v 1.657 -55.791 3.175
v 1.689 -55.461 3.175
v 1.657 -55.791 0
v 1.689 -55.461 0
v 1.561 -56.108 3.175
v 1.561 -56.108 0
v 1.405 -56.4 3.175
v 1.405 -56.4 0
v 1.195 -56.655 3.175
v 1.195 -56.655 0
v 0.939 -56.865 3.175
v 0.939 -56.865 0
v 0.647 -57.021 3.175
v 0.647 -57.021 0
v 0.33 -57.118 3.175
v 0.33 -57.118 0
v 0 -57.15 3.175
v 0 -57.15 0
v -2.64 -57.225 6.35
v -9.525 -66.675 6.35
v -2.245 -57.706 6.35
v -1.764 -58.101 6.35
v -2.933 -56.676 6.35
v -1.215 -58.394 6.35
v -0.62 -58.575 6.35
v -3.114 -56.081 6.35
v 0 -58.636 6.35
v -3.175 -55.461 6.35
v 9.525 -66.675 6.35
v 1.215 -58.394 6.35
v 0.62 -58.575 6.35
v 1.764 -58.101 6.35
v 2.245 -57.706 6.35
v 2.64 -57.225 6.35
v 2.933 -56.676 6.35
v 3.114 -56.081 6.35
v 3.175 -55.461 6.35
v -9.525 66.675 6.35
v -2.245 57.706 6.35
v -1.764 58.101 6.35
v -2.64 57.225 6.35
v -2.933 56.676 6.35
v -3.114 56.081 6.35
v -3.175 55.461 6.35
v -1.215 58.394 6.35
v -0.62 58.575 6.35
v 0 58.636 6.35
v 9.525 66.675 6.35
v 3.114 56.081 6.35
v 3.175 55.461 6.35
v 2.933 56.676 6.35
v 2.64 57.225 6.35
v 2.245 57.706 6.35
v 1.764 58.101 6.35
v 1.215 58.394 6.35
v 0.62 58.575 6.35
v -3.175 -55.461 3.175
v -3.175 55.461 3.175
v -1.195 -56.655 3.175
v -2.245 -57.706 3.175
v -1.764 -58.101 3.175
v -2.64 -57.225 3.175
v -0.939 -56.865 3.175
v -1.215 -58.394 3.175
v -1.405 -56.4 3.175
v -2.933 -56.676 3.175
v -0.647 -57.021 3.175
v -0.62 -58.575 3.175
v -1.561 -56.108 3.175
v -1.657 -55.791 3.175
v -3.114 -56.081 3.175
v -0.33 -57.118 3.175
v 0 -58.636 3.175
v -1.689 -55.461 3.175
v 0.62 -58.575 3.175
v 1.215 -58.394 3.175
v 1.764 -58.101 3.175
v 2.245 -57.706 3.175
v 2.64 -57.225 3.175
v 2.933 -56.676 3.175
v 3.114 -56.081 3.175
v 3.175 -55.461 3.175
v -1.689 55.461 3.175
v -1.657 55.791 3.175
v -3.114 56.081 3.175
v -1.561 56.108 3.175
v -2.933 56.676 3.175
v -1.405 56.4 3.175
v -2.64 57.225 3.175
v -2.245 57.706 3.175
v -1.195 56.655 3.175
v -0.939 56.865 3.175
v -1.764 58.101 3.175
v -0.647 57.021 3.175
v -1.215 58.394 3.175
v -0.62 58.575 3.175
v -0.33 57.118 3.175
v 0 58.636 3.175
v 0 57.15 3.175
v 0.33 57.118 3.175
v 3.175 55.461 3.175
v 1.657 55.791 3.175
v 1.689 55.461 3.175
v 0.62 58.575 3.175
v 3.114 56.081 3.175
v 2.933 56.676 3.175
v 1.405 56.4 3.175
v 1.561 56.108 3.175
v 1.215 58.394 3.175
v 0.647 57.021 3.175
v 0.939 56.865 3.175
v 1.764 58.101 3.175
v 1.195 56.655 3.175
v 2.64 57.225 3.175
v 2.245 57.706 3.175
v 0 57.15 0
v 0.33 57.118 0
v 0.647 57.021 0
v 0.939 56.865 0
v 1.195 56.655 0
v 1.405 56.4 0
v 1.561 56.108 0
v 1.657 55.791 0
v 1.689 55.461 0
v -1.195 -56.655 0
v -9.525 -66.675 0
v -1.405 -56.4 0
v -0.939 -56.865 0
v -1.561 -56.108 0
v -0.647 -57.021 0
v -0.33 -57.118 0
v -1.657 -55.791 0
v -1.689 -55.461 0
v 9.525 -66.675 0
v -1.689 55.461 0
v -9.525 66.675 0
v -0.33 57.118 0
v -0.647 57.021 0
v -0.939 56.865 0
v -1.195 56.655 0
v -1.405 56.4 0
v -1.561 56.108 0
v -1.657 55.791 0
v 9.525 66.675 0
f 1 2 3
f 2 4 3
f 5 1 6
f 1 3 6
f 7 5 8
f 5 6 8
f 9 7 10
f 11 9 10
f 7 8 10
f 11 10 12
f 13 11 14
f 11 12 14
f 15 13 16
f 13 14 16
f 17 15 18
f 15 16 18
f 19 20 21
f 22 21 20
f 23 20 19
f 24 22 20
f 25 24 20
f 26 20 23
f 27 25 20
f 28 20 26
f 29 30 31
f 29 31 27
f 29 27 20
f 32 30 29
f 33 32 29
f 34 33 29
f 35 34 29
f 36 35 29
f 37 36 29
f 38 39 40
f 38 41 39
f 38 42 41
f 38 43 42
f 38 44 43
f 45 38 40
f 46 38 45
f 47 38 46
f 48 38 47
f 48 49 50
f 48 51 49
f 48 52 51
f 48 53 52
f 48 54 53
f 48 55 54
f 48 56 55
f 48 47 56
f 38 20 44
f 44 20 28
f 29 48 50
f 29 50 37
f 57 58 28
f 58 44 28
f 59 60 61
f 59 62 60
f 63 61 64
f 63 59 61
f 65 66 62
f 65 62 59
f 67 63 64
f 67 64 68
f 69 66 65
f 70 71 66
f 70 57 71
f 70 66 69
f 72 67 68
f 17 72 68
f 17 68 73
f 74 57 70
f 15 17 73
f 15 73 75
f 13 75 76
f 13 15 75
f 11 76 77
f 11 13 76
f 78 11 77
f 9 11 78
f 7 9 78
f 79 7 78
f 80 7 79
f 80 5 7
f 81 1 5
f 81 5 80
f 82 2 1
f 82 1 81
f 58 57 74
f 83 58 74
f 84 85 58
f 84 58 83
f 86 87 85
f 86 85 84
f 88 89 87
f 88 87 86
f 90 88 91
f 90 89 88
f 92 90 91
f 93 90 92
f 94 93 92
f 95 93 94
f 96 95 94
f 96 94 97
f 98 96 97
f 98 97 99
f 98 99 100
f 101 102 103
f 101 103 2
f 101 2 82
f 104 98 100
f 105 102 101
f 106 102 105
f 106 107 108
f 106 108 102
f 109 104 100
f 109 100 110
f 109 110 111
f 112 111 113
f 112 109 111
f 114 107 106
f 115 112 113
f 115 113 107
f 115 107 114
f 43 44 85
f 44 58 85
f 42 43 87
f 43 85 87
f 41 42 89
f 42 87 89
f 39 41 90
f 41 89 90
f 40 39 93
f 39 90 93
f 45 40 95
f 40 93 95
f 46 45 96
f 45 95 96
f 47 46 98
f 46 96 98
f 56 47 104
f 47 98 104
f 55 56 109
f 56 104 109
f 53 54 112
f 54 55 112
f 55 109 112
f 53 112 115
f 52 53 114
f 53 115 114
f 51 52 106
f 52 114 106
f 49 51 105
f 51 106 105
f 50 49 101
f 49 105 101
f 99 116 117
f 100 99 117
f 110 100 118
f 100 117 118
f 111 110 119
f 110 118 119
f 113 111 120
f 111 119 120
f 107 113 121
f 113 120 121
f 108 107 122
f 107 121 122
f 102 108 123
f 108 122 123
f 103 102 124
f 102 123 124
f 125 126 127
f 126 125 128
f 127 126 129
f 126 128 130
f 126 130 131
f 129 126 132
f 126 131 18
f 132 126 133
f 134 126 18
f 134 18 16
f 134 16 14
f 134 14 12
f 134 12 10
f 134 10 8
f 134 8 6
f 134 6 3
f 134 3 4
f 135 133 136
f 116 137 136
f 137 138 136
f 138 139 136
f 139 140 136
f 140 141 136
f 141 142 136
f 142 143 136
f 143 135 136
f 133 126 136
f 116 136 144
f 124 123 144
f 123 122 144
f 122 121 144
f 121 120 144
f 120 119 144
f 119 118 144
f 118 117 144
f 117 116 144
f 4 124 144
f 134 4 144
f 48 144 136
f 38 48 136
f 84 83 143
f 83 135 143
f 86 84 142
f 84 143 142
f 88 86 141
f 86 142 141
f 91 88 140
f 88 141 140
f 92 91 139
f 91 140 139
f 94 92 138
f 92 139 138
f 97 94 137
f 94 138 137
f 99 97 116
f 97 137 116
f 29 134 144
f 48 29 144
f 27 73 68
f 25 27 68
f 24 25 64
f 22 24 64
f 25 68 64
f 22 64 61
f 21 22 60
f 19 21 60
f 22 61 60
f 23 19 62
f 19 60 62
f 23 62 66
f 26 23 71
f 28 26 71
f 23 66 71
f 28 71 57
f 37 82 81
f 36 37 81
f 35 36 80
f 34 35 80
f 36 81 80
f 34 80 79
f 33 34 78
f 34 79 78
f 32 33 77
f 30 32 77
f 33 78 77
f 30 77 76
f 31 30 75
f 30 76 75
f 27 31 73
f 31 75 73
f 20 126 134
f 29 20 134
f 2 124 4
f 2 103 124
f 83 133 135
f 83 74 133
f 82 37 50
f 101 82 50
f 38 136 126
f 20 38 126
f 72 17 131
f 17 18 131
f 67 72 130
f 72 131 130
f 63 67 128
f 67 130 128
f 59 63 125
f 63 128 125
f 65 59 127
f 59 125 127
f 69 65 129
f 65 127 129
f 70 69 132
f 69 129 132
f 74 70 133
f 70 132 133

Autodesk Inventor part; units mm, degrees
ref_plane "YZ Plane" through (0, 0, 0) normal (1, 0, 0) x (0, 1, 0)
ref_plane "XZ Plane" through (0, 0, 0) normal (0, 1, 0) x (-1, 0, 0)
ref_plane "XY Plane" through (0, 0, 0) normal (0, 0, 1) x (1, 0, 0)
sketch "Sketch1" plane through (0, 0, 0) normal (0, 0, 1) x (1, 0, 0)
  line L0 (-9.525, -66.675) -> (9.525, -66.675)
  line L1 (9.525, -66.675) -> (9.525, 66.675)
  line L2 (9.525, 66.675) -> (-9.525, 66.675)
  line L3 (-9.525, 66.675) -> (-9.525, -66.675)
  line L4 (-9.525, -66.675) -> (9.525, 66.675) construction
  line L5 (9.525, -66.675) -> (-9.525, 66.675) construction
  point P0 (0, 0)
  dimension "d0" = 19.05
  dimension "d1" = 133.35
extrude "Extrusion1" add sketch "Sketch1" along normal blind 6.35
sketch "Sketch4" plane through (0, 0, 6.35) normal (0, 0, 1) x (1, 0, 0)
  line L0 (1.6891, -57.15) -> (-1.6891, -57.15)
  line L1 (-1.6891, -57.15) -> (-1.6891, 57.15)
  line L2 (-1.6891, 57.15) -> (1.6891, 57.15)
  line L3 (1.6891, 57.15) -> (1.6891, -57.15)
  line L4 (1.6891, -57.15) -> (-1.6891, 57.15) construction
  line L5 (-1.6891, -57.15) -> (1.6891, 57.15) construction
  point P0 (0, 0)
  dimension "d16" = 3.3782
  dimension "d17" = 114.3
extrude "Extrusion3" cut sketch "Sketch4" against normal through all
fillet "Fillet2" radius 1.6891 4 edges at (-1.6891, 57.15, 3.175) (1.6891, 57.15, 3.175) (-1.6891, -57.15, 3.175) (1.6891, -57.15, 3.175)
sketch "Sketch5" plane through (0, 0, 6.35) normal (0, 0, 1) x (1, 0, 0)
  line L0 (-3.175, -58.6359) -> (3.175, -58.6359)
  line L1 (3.175, -58.6359) -> (3.175, 58.6359)
  line L2 (3.175, 58.6359) -> (-3.175, 58.6359)
  line L3 (-3.175, 58.6359) -> (-3.175, -58.6359)
  line L4 (-3.175, -58.6359) -> (3.175, 58.6359) construction
  line L5 (3.175, -58.6359) -> (-3.175, 58.6359) construction
  line L6 (1.6891, 55.4609) -> (1.6891, -55.4609) projected
  arc A0 (-1.6891, -55.4609) -> (1.6891, -55.4609) centre (0, -55.4609) ccw projected
  line L7 (-1.6891, -55.4609) -> (-1.6891, 55.4609) projected
  arc A1 (1.6891, 55.4609) -> (-1.6891, 55.4609) centre (0, 55.4609) ccw projected
  line L8 (-9.525, -66.675) -> (9.525, -66.675) projected
  line L9 (9.525, -66.675) -> (9.525, 66.675) projected
  line L10 (9.525, 66.675) -> (-9.525, 66.675) projected
  line L11 (-9.525, 66.675) -> (-9.525, -66.675) projected
  line L12 (-3.175, -58.6359) -> (3.175, -52.2859)
  point P0 (0, 0)
  dimension "d21" = 6.35
  dimension "d31" = 45
extrude "Extrusion4" cut sketch "Sketch5" against normal blind 3.175 contours L12 A0 L6 L1 L0 | L3 L2 L1 L12 L6 A1 L7 A0
fillet "Fillet3" radius 3.175 4 edges at (-3.175, -58.6359, 4.7625) (3.175, -58.6359, 4.7625) (3.175, 58.6359, 4.7625) (-3.175, 58.6359, 4.7625)
equation "\"d0\" = sensorHolderDepth"
equation "\"d1\" = width + internalAcrylicThickness"
equation "\"d2\" = acrylicThickness"
equation "\"d17\" = width - 2 * acrylicThickness"
equation "\"d18\" = acrylicThickness"
equation "\"acrylicThickness\" = 6.35"
equation "\"height\" = 127"
equation "\"width\" = 127"
equation "\"depth\" = 127"
equation "\"mirrorAngle\" = 5deg"
equation "\"detectorWidth\" = 52"
equation "\"detectorHeight\" = 52"
equation "\"mirrorThickness\" = 3.175"
equation "\"fresnelThickness\" = 0.1"
equation "\"focalLength\" = 76.2"
equation "\"ior\" = 1.49"
equation "\"centerThickness\" = 1.524"
equation "\"fresnelAngle\" = 90deg"
equation "\"fresnelEffectiveDiameter\" = 152.4"
equation "\"mirrorSuppourtWidth\" = 38.1"
equation "\"backGrooveBit\" = 4.8006"
equation "\"detectorOpeningWidth\" = 76.2"
equation "\"detectorOpeningHeight\" = 76.2"
equation "\"sensorHolderSensorHeight\" = 53.975"
equation "\"sensorHolderSensorWidth\" = 53.975"
equation "\"oRingWidth\" = 1.5875"
equation "\"sensorHolderORingID\" = 203.2"
equation "\"sensorHolderFlushORingID\" = 304.8"
equation "\"frontBackORingID\" = 419.1"
equation "\"mirrorGroove\" = 19.05"
equation "\"backMirrorGroove\" = 6.35"
equation "\"fresnelMirrorChamfer\" = 6.35"
equation "\"mirrorGrooveMill\" = 3.175"
equation "\"sensorHolderDepth\" = 19.05"
equation "\"internalAcrylicThicnkess\" = 6.35"
equation "\"frameAcrylicThickness\" = 9.525"
equation "\"internalAcrylicThickness\" = 6.35"
equation "\"aerogelClearence\" = 3.175"
equation "\"backplanePostionOffsett\" = 12.7"
equation "\"backplanePCBWidth\" = 76.2"
equation "\"backplanePCBHeight\" = 76.2"
equation "\"backplaneHoleOffsett\" = 6.35"
equation "\"moduleSlotClearence\" = 0.79375"
equation "\"plasticThickness\" = 6.35"
equation "\"aerogelHolderDepth\" = 37.30625"
properties part number "horizontalSupourt" material "ABS Plastic"
